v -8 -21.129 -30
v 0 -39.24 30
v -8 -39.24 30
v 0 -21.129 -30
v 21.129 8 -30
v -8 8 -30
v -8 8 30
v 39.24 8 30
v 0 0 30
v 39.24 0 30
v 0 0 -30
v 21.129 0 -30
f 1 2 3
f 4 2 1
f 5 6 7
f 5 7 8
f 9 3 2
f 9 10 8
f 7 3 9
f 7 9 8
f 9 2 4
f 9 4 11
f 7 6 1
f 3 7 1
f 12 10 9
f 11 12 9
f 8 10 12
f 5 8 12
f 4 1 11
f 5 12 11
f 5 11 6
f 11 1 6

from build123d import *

# Parameters (mm, degrees)
BOSS_EXTRUDE1_DEPTH = 30
CUT_EXTRUDE1_DEPTH  = 10
CUT_EXTRUDE2_DEPTH  = 83.096264686


with BuildPart() as part:
    # Sketch1 → Boss-Extrude1 (new, symmetric)
    with BuildSketch(Plane.XY):
        Polygon((40, 0), (0, 0), (0, -40), (-8, -40), (-8, 8), (40, 8), align=None)
    extrude(amount=BOSS_EXTRUDE1_DEPTH, both=True)

    # Sketch2 → Cut-Extrude1 (cut)
    with BuildSketch(Plane.XZ):
        Polygon((39.240243059, 30), (21.129361647, -30), (40, -30), (40, 30), align=None)
    extrude(amount=-CUT_EXTRUDE1_DEPTH, mode=Mode.SUBTRACT)

    # Sketch4 → Cut-Extrude2 (cut, through all)
    with BuildSketch(Plane(origin=(0, 0, -30), x_dir=(-1, 0, 0), z_dir=(0, 0, -1))):
        Polygon((0, 0), (8, 8), (8, -40), (0, -40), align=None)
    extrude(amount=-CUT_EXTRUDE2_DEPTH, mode=Mode.SUBTRACT)

    # Mirror1: part across plane


with BuildPart() as part_1:
    add(part.part)
    add(part.part.mirror(Plane(origin=(0, 0, 30), x_dir=(0, 0, 1), z_dir=(0.7071067811865476, 0.7071067811865476, 0))))


solid = part_1.part
